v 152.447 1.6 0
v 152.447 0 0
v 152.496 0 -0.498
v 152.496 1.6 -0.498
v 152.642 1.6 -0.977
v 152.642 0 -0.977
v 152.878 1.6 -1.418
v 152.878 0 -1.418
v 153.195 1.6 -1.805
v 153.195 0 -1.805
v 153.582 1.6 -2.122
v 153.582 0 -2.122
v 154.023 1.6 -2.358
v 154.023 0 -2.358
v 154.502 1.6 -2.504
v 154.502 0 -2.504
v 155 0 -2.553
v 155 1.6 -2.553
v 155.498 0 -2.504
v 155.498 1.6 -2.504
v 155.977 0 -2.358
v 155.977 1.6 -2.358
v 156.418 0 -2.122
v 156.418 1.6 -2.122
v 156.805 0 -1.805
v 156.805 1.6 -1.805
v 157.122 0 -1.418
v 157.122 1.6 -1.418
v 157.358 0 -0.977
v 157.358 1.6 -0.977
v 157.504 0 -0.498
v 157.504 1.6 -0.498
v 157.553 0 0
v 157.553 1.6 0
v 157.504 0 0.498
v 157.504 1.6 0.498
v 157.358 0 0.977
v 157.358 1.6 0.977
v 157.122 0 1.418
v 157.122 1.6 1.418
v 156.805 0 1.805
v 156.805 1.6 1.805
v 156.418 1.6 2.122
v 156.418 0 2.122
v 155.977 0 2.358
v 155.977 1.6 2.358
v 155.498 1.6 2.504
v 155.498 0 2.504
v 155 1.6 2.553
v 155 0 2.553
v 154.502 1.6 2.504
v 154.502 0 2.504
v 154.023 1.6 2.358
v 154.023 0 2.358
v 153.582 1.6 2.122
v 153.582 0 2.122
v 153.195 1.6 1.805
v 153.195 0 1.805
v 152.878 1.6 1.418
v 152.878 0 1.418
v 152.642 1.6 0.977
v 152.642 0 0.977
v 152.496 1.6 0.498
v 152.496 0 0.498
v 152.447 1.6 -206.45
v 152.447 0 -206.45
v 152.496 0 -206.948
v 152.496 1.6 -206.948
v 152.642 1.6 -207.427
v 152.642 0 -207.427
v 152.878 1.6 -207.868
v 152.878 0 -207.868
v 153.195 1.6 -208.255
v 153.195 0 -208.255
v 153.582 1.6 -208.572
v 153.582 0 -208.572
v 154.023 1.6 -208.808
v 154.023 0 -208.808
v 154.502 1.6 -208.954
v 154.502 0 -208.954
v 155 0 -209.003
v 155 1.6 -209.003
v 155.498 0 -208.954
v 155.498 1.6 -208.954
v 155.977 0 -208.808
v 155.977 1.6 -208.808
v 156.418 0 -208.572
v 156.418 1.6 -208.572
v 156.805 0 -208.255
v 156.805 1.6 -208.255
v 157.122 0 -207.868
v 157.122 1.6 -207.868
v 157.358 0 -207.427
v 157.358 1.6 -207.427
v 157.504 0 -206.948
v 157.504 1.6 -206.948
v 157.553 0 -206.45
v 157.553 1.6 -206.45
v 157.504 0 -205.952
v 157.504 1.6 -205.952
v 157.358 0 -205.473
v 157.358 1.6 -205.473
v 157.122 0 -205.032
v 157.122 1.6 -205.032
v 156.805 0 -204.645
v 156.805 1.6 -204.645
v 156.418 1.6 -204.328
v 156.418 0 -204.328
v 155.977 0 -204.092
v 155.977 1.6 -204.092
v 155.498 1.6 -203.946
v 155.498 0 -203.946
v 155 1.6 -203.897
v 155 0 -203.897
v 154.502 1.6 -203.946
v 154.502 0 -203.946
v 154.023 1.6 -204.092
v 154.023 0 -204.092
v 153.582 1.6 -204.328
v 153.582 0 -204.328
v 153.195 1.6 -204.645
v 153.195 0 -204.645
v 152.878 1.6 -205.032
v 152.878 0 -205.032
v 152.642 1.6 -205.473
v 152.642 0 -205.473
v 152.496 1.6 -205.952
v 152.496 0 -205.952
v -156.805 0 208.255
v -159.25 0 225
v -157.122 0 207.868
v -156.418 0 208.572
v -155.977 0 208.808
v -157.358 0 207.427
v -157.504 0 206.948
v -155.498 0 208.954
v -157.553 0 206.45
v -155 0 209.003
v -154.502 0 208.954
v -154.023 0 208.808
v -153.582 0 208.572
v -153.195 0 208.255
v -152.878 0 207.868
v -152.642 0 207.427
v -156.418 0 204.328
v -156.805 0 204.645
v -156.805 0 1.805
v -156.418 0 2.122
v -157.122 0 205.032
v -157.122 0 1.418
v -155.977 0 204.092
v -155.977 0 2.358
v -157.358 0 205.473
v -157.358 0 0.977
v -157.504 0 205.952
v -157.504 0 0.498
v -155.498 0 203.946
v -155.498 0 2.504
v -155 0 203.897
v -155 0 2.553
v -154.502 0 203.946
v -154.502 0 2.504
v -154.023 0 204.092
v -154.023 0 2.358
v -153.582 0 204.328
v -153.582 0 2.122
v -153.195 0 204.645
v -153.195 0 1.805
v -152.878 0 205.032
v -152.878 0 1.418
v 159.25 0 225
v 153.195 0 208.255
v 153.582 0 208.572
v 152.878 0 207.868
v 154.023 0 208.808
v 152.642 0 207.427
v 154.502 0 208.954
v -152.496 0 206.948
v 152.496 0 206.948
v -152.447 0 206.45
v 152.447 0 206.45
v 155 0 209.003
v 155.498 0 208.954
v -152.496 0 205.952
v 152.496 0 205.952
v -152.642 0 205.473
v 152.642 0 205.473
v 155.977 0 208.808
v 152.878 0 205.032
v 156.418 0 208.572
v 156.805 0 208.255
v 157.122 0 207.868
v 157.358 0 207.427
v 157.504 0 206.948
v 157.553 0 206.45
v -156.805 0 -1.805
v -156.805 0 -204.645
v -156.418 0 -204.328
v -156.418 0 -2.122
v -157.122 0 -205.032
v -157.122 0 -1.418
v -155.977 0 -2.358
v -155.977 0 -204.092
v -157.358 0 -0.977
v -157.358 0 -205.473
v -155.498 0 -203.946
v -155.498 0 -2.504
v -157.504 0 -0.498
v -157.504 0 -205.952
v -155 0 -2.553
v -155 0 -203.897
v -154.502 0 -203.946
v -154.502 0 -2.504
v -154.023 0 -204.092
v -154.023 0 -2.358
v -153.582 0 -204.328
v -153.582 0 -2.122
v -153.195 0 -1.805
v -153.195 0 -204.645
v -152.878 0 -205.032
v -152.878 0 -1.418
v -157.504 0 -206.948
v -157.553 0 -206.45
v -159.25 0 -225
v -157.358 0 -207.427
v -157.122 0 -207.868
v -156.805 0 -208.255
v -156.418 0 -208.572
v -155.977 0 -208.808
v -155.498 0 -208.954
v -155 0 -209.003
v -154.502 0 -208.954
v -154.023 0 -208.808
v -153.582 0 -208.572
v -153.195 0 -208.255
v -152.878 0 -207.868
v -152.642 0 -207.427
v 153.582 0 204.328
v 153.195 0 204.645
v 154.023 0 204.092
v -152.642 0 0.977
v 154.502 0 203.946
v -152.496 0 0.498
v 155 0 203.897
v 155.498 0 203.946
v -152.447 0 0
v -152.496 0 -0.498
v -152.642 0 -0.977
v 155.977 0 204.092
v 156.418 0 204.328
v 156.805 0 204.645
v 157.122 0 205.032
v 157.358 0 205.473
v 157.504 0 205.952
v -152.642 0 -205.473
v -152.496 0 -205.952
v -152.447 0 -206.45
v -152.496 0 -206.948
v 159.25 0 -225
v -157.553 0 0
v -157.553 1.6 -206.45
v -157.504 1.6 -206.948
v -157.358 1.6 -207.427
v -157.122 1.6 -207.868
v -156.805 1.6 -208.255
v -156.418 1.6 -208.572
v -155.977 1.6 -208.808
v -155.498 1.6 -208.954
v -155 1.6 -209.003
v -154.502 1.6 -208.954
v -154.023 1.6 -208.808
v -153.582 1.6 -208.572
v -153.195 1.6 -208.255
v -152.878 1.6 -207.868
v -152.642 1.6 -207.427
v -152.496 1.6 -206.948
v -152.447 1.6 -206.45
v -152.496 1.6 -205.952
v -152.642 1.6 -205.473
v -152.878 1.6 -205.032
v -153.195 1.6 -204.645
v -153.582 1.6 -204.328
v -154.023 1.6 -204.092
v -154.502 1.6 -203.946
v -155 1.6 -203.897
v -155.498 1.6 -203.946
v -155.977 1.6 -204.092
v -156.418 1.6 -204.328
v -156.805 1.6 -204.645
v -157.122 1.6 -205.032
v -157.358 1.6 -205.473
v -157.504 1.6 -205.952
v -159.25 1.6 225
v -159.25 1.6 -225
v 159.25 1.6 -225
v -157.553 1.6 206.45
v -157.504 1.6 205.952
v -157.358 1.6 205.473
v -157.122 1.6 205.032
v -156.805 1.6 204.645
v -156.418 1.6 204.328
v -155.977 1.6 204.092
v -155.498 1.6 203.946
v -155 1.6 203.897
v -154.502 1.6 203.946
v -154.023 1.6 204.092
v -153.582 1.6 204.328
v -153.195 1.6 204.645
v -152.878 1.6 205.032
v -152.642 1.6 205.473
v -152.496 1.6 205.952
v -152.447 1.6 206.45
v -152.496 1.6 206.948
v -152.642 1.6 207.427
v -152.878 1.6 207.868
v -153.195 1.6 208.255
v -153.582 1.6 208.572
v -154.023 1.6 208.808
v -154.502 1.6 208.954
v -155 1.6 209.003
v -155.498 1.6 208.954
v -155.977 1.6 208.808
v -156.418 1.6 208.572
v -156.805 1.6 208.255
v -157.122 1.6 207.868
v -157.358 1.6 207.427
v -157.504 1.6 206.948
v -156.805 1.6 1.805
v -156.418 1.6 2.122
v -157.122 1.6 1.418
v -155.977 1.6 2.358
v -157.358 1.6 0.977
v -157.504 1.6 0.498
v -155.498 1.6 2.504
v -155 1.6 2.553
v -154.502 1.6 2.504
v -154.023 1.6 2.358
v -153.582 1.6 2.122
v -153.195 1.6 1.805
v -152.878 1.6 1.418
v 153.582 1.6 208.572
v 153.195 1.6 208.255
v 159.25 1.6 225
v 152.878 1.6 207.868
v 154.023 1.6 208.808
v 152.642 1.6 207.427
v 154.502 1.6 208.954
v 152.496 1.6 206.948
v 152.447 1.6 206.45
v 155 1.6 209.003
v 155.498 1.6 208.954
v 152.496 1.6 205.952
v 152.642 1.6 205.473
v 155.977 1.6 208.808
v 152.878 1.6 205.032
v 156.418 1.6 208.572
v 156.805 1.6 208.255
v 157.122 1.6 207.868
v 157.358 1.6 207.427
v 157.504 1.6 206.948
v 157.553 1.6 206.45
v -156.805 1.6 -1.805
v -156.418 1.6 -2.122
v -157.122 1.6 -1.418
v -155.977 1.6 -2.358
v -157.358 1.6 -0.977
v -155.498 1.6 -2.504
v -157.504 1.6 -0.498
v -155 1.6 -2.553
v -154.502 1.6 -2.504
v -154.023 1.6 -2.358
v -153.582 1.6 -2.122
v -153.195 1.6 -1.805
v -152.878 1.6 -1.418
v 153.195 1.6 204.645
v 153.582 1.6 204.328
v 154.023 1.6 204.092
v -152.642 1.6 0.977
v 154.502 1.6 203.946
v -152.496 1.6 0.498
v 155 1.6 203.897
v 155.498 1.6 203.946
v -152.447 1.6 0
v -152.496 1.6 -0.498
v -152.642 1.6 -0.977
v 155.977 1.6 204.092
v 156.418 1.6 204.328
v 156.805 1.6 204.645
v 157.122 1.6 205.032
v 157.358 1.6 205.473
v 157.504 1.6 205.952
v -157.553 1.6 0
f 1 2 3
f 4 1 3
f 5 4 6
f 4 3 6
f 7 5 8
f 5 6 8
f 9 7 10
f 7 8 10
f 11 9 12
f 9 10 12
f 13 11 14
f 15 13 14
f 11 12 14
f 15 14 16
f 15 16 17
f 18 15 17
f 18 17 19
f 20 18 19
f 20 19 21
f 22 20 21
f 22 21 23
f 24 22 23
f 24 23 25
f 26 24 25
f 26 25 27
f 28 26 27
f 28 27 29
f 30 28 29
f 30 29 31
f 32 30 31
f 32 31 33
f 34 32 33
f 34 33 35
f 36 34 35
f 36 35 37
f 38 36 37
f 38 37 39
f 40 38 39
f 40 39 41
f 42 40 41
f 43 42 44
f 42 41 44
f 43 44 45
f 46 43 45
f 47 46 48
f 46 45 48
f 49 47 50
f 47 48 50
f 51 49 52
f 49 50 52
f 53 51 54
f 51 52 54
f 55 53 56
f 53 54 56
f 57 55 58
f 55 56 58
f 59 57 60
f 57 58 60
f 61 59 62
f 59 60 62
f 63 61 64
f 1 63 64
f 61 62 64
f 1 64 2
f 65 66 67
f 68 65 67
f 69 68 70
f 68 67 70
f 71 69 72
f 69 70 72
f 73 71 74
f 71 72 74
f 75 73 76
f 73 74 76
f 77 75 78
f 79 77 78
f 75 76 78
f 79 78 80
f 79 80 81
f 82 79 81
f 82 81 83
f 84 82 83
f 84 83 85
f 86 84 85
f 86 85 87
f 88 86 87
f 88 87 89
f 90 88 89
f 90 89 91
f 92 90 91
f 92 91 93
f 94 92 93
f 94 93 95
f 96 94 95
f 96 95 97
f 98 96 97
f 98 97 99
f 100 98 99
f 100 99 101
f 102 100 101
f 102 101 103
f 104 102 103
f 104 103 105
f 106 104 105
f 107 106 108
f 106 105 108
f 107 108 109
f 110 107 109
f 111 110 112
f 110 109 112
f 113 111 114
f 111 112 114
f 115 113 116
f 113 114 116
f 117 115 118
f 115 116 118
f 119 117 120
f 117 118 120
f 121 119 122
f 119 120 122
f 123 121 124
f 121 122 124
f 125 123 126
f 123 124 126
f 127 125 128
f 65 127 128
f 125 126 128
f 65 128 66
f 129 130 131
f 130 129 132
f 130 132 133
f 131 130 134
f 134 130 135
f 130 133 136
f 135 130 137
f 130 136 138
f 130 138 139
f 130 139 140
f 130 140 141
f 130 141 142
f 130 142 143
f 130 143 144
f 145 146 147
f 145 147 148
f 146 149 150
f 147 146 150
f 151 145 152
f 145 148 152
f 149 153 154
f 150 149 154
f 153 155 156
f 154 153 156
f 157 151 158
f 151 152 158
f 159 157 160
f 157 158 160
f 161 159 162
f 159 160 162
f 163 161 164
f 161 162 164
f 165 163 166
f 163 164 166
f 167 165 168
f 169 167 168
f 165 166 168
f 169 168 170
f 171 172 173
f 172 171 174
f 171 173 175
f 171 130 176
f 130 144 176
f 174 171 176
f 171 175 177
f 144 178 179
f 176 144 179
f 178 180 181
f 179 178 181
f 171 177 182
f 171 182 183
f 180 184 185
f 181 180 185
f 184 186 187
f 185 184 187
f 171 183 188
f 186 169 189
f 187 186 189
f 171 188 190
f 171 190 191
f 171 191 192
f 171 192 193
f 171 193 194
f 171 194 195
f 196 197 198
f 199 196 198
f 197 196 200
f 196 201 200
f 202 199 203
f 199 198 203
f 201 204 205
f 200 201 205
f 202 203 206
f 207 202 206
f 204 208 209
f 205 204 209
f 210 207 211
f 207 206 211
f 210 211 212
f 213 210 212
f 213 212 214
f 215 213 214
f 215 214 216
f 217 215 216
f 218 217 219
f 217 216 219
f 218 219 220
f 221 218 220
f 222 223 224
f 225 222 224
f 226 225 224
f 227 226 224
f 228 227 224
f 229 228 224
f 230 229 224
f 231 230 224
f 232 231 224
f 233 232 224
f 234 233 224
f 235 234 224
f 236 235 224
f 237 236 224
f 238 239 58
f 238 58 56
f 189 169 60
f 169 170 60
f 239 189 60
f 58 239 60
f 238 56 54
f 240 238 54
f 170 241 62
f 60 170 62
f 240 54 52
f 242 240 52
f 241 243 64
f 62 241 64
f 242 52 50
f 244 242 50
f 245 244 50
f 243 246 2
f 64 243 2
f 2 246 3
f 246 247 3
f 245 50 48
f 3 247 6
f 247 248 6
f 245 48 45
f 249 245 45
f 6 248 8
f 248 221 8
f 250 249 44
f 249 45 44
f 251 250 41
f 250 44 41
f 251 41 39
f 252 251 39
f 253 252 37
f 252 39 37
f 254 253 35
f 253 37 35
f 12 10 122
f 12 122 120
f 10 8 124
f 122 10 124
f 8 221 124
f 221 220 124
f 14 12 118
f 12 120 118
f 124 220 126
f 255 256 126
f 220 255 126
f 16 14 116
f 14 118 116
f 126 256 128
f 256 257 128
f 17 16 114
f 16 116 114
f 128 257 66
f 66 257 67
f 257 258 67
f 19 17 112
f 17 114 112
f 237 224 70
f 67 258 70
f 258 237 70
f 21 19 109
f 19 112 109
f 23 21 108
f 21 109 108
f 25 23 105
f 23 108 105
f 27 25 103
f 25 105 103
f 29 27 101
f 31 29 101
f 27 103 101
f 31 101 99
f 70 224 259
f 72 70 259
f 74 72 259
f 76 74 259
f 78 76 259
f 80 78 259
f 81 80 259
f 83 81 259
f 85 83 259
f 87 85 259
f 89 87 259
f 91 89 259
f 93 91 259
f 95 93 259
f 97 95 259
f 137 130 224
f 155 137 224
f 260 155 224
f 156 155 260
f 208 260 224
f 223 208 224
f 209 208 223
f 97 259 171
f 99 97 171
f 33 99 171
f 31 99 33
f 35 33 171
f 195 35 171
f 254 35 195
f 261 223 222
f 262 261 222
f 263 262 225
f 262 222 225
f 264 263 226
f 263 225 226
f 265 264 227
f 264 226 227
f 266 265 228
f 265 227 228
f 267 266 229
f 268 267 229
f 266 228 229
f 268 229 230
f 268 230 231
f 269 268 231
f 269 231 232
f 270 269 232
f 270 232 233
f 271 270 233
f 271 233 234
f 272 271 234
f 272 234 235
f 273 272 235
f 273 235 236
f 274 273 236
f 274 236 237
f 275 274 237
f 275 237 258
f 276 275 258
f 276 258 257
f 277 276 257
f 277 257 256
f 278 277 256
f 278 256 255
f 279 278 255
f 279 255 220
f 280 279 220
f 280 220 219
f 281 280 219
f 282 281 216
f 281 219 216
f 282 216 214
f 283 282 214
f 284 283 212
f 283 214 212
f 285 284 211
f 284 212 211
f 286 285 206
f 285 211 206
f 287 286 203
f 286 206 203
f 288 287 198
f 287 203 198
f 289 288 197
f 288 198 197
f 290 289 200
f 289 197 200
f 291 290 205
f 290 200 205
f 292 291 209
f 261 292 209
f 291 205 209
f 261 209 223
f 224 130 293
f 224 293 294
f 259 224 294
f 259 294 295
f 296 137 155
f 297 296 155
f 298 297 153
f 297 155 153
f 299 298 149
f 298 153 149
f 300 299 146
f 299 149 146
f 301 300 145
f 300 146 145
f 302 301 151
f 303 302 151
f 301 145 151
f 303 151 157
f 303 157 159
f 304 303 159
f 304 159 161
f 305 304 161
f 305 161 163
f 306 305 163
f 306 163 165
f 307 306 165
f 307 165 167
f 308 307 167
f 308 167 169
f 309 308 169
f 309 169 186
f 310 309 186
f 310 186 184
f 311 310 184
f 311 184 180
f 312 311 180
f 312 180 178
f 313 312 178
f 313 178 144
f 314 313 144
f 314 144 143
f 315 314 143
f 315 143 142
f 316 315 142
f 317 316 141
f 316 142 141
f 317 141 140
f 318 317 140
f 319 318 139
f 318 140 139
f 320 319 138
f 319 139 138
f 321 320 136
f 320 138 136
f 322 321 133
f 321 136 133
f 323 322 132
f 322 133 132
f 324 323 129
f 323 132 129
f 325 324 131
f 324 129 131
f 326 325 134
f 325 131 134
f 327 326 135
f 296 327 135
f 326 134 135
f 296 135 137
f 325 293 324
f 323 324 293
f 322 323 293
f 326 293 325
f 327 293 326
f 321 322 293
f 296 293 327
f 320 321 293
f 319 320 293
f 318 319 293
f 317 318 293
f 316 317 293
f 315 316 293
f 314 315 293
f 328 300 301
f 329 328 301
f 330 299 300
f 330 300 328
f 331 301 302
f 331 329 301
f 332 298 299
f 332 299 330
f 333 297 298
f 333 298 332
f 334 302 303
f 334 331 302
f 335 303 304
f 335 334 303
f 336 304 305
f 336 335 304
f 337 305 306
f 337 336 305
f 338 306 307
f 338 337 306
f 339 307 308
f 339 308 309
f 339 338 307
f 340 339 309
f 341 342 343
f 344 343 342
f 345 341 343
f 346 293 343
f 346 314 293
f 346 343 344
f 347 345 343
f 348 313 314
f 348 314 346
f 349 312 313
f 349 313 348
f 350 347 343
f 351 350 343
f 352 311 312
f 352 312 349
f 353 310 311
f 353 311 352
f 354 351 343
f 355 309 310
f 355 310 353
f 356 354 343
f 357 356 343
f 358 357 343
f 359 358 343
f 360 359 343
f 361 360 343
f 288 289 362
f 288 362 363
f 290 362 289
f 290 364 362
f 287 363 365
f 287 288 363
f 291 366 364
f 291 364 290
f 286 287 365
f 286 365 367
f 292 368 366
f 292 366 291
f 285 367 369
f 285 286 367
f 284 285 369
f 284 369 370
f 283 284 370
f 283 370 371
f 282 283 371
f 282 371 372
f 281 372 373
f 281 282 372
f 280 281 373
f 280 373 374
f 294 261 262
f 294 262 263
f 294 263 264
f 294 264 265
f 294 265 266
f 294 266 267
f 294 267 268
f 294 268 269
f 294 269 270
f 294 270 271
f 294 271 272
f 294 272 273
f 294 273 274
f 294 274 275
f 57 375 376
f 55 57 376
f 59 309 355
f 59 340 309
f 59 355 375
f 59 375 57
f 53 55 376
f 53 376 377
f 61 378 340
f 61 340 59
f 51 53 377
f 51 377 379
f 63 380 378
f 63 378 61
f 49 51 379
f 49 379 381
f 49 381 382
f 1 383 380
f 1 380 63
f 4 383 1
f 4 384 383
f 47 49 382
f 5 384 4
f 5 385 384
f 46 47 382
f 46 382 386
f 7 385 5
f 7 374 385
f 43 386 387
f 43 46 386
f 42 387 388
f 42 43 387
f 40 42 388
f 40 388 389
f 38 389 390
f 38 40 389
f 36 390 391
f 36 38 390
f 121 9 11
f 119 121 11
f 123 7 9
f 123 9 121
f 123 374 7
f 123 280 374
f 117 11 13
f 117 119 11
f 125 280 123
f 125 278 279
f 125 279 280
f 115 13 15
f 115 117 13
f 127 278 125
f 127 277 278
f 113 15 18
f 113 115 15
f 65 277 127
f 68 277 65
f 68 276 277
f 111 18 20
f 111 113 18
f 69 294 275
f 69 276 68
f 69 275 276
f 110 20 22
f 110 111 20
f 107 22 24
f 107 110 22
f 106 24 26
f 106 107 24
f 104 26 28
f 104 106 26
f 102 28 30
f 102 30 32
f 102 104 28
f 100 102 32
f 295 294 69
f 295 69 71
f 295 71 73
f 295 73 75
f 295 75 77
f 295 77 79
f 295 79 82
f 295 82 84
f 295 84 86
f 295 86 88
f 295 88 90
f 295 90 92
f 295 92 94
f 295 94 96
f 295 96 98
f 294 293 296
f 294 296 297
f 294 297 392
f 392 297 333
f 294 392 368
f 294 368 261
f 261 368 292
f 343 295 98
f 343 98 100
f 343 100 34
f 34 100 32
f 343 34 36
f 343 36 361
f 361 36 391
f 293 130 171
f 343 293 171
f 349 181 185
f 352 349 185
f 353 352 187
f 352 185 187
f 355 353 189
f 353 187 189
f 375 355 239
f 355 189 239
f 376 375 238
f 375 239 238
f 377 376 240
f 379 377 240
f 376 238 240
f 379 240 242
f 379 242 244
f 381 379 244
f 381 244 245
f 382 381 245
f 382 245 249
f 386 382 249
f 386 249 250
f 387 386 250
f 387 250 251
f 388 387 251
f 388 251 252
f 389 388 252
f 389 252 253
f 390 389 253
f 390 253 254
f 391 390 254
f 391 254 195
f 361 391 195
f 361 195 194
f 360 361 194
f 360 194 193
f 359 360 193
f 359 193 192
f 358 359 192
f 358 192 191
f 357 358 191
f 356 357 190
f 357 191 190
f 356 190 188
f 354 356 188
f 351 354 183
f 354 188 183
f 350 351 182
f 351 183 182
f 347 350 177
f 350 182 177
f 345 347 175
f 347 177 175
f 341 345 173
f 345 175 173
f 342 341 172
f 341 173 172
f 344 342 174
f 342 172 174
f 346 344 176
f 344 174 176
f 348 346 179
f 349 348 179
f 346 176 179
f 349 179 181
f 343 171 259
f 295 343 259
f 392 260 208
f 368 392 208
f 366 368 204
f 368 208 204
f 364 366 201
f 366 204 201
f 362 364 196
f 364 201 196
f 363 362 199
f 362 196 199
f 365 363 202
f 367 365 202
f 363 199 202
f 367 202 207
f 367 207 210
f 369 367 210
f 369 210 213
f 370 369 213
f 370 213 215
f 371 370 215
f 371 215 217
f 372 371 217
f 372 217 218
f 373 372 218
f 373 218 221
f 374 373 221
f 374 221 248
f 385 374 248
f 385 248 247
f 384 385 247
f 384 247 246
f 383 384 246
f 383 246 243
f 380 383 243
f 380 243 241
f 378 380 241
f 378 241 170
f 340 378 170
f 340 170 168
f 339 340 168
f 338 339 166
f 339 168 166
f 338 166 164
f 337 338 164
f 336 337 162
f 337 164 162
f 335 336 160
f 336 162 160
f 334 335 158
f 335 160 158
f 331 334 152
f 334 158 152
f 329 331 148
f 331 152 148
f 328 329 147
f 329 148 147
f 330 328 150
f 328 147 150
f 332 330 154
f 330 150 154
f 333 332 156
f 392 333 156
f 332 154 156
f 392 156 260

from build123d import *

# Parameters (mm, degrees)
SKETCH1_W                  = 318.5
SKETCH1_H                  = 450
BOSS_EXTRUDE1_DEPTH        = 1.6002
F_10_CLEARANCE_HOLE1_D     = 5.1054
F_10_CLEARANCE_HOLE1_DEPTH = 129.53
F_10_CLEARANCE_HOLE1_TIP   = 1.533816902


with BuildPart() as part:
    # Sketch1 → Boss-Extrude1 (new body)
    with BuildSketch(Plane(origin=(0, 0, 0), x_dir=(1, 0, 0), z_dir=(0, 1, 0))):
        Rectangle(SKETCH1_W, SKETCH1_H)
    extrude(amount=BOSS_EXTRUDE1_DEPTH)

    # #10 Clearance Hole1
    with Locations(Plane(origin=(0, 1.6002, 0), x_dir=(1, 0, 0), z_dir=(0, 1, 0))):
        with Locations((-155, 206.45), (155, 206.45), (155, 0), (155, -206.45), (-155, -206.45), (-155, 0)):
            Hole(F_10_CLEARANCE_HOLE1_D / 2, depth=F_10_CLEARANCE_HOLE1_DEPTH)
            with Locations((0, 0, -(F_10_CLEARANCE_HOLE1_DEPTH + F_10_CLEARANCE_HOLE1_TIP / 2))):  # 118° drill point
                Cone(0, F_10_CLEARANCE_HOLE1_D / 2, F_10_CLEARANCE_HOLE1_TIP, mode=Mode.SUBTRACT)


solid = part.part
